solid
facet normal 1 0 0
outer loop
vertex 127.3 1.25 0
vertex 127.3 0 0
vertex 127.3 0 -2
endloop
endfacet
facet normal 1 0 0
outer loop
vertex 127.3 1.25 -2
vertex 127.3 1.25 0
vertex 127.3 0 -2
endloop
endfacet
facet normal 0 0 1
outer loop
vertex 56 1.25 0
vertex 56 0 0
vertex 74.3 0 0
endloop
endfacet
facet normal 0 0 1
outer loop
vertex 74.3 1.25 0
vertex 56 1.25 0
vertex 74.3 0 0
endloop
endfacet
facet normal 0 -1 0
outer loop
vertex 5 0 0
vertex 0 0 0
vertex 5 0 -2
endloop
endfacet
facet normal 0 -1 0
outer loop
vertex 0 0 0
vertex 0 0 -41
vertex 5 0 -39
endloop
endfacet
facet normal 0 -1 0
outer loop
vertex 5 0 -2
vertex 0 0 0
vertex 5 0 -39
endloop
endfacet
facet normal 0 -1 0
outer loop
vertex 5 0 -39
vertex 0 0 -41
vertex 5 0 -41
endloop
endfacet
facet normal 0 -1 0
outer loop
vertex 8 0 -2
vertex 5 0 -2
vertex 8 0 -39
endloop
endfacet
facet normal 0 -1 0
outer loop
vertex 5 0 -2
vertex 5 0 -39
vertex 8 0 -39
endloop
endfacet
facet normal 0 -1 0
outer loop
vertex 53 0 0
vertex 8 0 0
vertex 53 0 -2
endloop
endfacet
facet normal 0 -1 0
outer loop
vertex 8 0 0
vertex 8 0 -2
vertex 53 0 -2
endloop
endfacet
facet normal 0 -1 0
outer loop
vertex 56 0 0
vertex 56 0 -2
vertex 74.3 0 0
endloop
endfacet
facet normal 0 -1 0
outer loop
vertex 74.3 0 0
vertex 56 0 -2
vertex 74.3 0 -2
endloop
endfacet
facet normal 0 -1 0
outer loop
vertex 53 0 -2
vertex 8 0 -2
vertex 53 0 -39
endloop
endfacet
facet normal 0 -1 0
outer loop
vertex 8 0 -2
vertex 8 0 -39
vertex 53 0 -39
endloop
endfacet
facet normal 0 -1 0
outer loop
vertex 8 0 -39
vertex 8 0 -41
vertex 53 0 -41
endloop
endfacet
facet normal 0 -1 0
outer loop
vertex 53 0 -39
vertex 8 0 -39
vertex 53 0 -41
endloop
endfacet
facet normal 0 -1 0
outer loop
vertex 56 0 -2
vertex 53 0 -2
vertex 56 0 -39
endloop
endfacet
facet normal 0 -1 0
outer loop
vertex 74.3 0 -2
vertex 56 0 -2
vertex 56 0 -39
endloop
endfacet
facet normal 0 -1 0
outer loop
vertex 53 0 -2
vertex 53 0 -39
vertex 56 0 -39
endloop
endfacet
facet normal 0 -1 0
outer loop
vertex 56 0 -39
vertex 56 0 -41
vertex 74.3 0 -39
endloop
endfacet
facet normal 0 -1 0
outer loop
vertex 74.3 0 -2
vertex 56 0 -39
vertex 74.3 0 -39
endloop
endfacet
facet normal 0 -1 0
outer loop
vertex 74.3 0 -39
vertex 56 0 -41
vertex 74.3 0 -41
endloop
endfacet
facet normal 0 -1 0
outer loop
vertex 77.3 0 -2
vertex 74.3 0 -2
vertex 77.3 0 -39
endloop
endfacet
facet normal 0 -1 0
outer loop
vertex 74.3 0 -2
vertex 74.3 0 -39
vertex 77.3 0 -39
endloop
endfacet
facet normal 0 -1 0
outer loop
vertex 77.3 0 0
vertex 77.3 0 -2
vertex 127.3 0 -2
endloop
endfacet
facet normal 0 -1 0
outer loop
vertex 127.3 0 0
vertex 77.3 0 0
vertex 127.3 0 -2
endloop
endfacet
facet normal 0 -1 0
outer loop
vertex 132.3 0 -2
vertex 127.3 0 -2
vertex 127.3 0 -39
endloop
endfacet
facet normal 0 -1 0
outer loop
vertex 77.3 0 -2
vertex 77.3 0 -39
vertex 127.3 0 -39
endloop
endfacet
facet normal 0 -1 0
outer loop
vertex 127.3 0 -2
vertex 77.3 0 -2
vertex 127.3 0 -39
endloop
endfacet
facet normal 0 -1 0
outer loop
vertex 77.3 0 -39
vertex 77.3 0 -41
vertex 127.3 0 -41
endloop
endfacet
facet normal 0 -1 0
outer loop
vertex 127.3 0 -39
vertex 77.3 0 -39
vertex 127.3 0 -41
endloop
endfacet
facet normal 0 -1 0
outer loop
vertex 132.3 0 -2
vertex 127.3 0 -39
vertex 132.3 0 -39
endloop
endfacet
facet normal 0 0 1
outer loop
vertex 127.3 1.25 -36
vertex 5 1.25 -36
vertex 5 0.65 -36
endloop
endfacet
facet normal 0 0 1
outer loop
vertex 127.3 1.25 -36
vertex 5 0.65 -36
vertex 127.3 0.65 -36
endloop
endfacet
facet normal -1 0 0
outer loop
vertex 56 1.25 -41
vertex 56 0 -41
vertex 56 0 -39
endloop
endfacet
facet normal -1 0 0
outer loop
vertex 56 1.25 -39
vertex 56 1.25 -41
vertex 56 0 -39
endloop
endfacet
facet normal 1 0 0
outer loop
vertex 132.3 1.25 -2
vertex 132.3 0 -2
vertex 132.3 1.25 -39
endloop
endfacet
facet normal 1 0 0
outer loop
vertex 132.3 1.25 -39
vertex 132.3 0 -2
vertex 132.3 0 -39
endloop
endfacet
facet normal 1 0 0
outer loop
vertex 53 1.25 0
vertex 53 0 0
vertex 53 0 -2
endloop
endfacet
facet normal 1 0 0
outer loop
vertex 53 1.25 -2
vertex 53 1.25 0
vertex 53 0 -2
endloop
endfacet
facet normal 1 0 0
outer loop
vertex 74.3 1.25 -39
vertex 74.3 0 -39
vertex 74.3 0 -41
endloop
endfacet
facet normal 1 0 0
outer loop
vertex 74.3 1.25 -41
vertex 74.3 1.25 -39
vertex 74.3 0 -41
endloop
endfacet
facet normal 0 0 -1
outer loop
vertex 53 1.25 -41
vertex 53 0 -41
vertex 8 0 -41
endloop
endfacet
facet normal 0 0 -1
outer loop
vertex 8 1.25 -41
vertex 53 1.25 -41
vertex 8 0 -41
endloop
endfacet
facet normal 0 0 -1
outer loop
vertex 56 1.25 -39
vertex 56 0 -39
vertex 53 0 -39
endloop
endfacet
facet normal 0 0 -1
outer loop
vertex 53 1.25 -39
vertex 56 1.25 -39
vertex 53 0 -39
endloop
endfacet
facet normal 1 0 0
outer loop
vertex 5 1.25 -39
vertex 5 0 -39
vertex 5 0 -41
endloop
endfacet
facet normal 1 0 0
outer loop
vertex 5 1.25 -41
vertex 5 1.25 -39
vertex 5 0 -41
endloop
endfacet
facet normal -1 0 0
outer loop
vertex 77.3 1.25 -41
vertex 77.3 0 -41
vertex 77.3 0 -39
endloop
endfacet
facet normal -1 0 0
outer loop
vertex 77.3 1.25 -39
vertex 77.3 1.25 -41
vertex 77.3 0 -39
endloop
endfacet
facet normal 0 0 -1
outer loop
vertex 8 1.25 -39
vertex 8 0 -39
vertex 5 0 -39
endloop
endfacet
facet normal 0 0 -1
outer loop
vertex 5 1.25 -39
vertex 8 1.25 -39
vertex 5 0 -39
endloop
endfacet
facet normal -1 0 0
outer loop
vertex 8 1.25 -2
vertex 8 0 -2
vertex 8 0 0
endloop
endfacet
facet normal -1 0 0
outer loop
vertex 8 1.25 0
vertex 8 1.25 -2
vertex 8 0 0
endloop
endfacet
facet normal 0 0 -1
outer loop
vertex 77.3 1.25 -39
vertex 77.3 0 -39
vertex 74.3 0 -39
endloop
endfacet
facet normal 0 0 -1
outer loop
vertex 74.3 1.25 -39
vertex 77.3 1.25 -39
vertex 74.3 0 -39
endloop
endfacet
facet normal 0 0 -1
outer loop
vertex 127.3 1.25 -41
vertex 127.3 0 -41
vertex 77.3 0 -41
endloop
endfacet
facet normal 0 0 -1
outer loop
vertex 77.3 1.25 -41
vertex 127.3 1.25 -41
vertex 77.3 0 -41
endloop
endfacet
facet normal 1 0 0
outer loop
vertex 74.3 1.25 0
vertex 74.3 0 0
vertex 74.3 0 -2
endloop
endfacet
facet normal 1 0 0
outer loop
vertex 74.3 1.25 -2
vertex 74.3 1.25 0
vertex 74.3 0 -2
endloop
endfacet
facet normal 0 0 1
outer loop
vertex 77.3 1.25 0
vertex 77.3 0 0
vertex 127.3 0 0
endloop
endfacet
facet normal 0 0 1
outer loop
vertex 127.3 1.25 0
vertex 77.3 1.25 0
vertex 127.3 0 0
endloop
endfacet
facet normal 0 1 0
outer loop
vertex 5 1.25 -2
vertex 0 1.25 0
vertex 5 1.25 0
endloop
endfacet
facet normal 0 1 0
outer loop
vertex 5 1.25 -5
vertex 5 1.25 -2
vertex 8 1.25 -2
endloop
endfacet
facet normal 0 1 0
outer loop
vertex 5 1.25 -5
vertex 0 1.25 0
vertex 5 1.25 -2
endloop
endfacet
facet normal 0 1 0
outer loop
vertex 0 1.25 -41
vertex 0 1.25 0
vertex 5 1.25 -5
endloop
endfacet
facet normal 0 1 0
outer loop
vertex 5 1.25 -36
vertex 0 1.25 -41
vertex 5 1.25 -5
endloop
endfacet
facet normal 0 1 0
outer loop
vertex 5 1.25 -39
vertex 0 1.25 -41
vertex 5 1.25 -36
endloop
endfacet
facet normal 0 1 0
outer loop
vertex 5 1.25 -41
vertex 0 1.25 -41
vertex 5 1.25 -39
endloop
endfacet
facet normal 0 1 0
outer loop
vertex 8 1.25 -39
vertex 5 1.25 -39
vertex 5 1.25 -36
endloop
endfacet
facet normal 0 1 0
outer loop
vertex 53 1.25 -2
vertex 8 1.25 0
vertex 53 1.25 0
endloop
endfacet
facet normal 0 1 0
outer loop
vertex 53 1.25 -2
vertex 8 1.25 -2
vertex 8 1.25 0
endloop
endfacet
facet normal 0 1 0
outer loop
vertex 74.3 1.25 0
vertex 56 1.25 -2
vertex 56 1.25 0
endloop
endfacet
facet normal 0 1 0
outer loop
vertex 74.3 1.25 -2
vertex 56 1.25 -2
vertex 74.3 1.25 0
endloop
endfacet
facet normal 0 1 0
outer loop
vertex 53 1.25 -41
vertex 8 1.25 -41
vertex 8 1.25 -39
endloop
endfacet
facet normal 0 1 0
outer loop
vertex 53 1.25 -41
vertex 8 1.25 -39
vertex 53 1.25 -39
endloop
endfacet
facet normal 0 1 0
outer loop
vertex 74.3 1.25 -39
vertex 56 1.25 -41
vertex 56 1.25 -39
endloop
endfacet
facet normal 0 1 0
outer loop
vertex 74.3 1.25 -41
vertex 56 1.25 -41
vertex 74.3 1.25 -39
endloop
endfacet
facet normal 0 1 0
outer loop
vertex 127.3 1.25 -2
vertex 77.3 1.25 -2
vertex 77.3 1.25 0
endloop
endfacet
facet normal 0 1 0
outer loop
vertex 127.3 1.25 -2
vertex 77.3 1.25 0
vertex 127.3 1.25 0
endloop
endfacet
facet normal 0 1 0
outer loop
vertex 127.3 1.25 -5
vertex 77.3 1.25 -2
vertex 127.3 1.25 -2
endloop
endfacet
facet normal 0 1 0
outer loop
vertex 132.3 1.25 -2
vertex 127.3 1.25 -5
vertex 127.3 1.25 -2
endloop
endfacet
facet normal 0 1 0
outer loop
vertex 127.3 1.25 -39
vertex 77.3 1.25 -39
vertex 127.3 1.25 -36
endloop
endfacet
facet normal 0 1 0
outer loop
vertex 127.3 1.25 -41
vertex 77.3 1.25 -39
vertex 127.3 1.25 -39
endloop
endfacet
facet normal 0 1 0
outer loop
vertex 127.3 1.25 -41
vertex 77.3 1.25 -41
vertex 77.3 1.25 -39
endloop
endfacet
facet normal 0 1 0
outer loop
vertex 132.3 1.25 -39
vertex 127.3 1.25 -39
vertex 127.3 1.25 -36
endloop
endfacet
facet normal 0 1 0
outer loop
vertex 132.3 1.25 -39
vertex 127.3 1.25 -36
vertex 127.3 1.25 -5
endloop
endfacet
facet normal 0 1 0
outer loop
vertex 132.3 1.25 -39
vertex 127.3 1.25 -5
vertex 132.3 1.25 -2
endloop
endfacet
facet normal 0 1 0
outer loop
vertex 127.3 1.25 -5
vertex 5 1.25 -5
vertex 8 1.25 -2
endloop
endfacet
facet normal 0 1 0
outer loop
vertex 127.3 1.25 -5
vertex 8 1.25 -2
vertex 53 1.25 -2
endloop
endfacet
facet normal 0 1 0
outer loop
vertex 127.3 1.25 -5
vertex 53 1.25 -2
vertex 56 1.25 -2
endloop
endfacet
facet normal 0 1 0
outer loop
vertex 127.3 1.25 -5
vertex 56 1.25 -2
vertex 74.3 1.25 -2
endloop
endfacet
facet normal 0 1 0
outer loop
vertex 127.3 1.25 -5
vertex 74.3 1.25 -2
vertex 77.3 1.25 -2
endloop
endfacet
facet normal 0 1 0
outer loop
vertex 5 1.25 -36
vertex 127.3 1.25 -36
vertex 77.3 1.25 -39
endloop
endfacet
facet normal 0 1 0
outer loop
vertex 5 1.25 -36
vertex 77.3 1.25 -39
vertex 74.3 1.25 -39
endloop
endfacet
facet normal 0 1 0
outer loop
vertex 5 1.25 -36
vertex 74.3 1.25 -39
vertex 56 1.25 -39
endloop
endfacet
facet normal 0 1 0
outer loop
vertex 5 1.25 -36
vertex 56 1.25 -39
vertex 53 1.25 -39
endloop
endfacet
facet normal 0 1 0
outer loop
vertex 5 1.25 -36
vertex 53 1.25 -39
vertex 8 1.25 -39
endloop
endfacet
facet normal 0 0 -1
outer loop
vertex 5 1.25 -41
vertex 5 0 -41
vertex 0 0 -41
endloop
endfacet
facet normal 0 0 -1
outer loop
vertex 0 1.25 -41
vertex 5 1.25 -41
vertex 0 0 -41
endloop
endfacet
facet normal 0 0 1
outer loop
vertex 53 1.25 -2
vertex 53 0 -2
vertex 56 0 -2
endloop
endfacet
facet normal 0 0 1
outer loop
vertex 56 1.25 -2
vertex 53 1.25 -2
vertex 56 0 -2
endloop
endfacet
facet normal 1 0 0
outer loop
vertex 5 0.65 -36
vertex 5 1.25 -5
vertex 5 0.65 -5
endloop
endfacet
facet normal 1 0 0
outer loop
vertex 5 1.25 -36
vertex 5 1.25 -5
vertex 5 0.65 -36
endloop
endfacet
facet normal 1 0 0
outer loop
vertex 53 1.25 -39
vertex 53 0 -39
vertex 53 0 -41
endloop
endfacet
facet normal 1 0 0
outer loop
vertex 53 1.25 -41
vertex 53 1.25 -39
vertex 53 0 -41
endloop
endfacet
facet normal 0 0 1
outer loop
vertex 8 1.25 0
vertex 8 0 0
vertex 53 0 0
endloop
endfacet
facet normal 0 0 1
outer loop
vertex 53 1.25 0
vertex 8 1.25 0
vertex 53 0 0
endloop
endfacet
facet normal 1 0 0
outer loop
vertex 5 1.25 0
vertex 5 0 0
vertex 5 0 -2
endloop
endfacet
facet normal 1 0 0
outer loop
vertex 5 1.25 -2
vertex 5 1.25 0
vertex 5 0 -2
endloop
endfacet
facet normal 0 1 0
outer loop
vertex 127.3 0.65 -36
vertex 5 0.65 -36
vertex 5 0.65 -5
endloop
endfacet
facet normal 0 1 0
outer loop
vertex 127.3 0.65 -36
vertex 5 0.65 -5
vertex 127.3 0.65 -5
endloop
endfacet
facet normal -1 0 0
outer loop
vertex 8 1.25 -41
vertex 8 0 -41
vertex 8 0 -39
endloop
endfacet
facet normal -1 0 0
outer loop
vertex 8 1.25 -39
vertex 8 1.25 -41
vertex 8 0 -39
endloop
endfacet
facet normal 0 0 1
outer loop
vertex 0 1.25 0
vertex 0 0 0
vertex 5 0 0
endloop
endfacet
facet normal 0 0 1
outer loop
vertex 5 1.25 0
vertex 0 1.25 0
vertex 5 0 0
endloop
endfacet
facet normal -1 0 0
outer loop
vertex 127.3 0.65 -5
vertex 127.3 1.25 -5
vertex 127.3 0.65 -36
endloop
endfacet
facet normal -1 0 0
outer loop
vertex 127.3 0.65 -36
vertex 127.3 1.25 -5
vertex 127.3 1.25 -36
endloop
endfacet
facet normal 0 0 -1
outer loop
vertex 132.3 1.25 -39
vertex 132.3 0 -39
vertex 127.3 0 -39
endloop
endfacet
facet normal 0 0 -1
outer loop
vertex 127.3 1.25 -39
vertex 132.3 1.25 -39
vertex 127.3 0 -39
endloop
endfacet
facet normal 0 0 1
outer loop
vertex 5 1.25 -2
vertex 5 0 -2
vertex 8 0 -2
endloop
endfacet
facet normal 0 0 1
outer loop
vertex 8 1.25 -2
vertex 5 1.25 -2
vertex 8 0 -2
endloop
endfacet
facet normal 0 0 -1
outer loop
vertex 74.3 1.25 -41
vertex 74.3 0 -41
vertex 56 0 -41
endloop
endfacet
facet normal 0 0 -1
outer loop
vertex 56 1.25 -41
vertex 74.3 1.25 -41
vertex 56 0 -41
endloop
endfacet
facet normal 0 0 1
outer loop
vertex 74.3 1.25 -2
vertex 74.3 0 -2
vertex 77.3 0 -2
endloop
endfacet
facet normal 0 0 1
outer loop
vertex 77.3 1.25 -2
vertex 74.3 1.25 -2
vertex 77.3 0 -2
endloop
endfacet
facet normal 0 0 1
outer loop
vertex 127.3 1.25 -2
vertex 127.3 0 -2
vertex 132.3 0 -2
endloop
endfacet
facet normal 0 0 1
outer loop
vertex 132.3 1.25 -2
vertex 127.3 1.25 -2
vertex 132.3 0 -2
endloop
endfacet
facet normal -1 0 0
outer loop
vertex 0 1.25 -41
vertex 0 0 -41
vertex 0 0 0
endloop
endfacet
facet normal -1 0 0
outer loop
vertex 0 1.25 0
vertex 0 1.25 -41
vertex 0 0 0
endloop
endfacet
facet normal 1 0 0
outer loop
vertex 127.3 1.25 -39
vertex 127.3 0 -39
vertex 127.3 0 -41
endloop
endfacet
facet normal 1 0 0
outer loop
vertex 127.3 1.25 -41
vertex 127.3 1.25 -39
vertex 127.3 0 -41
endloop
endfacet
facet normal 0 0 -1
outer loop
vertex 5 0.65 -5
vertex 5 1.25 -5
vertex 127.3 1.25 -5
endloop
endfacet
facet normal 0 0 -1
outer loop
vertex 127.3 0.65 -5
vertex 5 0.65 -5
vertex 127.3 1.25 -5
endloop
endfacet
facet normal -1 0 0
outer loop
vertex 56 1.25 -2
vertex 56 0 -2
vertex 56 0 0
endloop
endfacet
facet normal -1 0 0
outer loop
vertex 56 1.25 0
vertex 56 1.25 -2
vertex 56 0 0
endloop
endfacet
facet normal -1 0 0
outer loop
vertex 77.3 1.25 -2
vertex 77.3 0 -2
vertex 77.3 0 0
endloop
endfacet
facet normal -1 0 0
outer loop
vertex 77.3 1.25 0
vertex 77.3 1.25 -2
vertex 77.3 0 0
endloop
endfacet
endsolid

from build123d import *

# Parameters (mm, degrees)
BOSS_EXTRUDE1_DEPTH = 1.25
SKETCH2_W           = 122.3
SKETCH2_H           = 31
CUT_EXTRUDE1_DEPTH  = 0.6


with BuildPart() as part:
    # Sketch1 → Boss-Extrude1 (new body)
    with BuildSketch(Plane(origin=(0, 0, 0), x_dir=(1, 0, 0), z_dir=(0, 1, 0))):
        Polygon((8, 0), (53, 0), (53, 2), (56, 2), (56, 0), (74.3, 0), (74.3, 2), (77.3, 2), (77.3, 0), (127.3, 0), (127.3, 2), (132.3, 2), (132.3, 39), (127.3, 39), (127.3, 41), (77.3, 41), (77.3, 39), (74.3, 39), (74.3, 41), (56, 41), (56, 39), (53, 39), (53, 41), (8, 41), (8, 39), (5, 39), (5, 41), (0, 41), (0, 0), (5, 0), (5, 2), (8, 2), align=None)
    extrude(amount=BOSS_EXTRUDE1_DEPTH)

    # Sketch2 → Cut-Extrude1 (cut)
    with BuildSketch(Plane(origin=(0, 1.25, 0), x_dir=(1, 0, 0), z_dir=(0, 1, 0))):
        with Locations((66.15, 20.5)):
            Rectangle(SKETCH2_W, SKETCH2_H)
    extrude(amount=-CUT_EXTRUDE1_DEPTH, mode=Mode.SUBTRACT)


solid = part.part
